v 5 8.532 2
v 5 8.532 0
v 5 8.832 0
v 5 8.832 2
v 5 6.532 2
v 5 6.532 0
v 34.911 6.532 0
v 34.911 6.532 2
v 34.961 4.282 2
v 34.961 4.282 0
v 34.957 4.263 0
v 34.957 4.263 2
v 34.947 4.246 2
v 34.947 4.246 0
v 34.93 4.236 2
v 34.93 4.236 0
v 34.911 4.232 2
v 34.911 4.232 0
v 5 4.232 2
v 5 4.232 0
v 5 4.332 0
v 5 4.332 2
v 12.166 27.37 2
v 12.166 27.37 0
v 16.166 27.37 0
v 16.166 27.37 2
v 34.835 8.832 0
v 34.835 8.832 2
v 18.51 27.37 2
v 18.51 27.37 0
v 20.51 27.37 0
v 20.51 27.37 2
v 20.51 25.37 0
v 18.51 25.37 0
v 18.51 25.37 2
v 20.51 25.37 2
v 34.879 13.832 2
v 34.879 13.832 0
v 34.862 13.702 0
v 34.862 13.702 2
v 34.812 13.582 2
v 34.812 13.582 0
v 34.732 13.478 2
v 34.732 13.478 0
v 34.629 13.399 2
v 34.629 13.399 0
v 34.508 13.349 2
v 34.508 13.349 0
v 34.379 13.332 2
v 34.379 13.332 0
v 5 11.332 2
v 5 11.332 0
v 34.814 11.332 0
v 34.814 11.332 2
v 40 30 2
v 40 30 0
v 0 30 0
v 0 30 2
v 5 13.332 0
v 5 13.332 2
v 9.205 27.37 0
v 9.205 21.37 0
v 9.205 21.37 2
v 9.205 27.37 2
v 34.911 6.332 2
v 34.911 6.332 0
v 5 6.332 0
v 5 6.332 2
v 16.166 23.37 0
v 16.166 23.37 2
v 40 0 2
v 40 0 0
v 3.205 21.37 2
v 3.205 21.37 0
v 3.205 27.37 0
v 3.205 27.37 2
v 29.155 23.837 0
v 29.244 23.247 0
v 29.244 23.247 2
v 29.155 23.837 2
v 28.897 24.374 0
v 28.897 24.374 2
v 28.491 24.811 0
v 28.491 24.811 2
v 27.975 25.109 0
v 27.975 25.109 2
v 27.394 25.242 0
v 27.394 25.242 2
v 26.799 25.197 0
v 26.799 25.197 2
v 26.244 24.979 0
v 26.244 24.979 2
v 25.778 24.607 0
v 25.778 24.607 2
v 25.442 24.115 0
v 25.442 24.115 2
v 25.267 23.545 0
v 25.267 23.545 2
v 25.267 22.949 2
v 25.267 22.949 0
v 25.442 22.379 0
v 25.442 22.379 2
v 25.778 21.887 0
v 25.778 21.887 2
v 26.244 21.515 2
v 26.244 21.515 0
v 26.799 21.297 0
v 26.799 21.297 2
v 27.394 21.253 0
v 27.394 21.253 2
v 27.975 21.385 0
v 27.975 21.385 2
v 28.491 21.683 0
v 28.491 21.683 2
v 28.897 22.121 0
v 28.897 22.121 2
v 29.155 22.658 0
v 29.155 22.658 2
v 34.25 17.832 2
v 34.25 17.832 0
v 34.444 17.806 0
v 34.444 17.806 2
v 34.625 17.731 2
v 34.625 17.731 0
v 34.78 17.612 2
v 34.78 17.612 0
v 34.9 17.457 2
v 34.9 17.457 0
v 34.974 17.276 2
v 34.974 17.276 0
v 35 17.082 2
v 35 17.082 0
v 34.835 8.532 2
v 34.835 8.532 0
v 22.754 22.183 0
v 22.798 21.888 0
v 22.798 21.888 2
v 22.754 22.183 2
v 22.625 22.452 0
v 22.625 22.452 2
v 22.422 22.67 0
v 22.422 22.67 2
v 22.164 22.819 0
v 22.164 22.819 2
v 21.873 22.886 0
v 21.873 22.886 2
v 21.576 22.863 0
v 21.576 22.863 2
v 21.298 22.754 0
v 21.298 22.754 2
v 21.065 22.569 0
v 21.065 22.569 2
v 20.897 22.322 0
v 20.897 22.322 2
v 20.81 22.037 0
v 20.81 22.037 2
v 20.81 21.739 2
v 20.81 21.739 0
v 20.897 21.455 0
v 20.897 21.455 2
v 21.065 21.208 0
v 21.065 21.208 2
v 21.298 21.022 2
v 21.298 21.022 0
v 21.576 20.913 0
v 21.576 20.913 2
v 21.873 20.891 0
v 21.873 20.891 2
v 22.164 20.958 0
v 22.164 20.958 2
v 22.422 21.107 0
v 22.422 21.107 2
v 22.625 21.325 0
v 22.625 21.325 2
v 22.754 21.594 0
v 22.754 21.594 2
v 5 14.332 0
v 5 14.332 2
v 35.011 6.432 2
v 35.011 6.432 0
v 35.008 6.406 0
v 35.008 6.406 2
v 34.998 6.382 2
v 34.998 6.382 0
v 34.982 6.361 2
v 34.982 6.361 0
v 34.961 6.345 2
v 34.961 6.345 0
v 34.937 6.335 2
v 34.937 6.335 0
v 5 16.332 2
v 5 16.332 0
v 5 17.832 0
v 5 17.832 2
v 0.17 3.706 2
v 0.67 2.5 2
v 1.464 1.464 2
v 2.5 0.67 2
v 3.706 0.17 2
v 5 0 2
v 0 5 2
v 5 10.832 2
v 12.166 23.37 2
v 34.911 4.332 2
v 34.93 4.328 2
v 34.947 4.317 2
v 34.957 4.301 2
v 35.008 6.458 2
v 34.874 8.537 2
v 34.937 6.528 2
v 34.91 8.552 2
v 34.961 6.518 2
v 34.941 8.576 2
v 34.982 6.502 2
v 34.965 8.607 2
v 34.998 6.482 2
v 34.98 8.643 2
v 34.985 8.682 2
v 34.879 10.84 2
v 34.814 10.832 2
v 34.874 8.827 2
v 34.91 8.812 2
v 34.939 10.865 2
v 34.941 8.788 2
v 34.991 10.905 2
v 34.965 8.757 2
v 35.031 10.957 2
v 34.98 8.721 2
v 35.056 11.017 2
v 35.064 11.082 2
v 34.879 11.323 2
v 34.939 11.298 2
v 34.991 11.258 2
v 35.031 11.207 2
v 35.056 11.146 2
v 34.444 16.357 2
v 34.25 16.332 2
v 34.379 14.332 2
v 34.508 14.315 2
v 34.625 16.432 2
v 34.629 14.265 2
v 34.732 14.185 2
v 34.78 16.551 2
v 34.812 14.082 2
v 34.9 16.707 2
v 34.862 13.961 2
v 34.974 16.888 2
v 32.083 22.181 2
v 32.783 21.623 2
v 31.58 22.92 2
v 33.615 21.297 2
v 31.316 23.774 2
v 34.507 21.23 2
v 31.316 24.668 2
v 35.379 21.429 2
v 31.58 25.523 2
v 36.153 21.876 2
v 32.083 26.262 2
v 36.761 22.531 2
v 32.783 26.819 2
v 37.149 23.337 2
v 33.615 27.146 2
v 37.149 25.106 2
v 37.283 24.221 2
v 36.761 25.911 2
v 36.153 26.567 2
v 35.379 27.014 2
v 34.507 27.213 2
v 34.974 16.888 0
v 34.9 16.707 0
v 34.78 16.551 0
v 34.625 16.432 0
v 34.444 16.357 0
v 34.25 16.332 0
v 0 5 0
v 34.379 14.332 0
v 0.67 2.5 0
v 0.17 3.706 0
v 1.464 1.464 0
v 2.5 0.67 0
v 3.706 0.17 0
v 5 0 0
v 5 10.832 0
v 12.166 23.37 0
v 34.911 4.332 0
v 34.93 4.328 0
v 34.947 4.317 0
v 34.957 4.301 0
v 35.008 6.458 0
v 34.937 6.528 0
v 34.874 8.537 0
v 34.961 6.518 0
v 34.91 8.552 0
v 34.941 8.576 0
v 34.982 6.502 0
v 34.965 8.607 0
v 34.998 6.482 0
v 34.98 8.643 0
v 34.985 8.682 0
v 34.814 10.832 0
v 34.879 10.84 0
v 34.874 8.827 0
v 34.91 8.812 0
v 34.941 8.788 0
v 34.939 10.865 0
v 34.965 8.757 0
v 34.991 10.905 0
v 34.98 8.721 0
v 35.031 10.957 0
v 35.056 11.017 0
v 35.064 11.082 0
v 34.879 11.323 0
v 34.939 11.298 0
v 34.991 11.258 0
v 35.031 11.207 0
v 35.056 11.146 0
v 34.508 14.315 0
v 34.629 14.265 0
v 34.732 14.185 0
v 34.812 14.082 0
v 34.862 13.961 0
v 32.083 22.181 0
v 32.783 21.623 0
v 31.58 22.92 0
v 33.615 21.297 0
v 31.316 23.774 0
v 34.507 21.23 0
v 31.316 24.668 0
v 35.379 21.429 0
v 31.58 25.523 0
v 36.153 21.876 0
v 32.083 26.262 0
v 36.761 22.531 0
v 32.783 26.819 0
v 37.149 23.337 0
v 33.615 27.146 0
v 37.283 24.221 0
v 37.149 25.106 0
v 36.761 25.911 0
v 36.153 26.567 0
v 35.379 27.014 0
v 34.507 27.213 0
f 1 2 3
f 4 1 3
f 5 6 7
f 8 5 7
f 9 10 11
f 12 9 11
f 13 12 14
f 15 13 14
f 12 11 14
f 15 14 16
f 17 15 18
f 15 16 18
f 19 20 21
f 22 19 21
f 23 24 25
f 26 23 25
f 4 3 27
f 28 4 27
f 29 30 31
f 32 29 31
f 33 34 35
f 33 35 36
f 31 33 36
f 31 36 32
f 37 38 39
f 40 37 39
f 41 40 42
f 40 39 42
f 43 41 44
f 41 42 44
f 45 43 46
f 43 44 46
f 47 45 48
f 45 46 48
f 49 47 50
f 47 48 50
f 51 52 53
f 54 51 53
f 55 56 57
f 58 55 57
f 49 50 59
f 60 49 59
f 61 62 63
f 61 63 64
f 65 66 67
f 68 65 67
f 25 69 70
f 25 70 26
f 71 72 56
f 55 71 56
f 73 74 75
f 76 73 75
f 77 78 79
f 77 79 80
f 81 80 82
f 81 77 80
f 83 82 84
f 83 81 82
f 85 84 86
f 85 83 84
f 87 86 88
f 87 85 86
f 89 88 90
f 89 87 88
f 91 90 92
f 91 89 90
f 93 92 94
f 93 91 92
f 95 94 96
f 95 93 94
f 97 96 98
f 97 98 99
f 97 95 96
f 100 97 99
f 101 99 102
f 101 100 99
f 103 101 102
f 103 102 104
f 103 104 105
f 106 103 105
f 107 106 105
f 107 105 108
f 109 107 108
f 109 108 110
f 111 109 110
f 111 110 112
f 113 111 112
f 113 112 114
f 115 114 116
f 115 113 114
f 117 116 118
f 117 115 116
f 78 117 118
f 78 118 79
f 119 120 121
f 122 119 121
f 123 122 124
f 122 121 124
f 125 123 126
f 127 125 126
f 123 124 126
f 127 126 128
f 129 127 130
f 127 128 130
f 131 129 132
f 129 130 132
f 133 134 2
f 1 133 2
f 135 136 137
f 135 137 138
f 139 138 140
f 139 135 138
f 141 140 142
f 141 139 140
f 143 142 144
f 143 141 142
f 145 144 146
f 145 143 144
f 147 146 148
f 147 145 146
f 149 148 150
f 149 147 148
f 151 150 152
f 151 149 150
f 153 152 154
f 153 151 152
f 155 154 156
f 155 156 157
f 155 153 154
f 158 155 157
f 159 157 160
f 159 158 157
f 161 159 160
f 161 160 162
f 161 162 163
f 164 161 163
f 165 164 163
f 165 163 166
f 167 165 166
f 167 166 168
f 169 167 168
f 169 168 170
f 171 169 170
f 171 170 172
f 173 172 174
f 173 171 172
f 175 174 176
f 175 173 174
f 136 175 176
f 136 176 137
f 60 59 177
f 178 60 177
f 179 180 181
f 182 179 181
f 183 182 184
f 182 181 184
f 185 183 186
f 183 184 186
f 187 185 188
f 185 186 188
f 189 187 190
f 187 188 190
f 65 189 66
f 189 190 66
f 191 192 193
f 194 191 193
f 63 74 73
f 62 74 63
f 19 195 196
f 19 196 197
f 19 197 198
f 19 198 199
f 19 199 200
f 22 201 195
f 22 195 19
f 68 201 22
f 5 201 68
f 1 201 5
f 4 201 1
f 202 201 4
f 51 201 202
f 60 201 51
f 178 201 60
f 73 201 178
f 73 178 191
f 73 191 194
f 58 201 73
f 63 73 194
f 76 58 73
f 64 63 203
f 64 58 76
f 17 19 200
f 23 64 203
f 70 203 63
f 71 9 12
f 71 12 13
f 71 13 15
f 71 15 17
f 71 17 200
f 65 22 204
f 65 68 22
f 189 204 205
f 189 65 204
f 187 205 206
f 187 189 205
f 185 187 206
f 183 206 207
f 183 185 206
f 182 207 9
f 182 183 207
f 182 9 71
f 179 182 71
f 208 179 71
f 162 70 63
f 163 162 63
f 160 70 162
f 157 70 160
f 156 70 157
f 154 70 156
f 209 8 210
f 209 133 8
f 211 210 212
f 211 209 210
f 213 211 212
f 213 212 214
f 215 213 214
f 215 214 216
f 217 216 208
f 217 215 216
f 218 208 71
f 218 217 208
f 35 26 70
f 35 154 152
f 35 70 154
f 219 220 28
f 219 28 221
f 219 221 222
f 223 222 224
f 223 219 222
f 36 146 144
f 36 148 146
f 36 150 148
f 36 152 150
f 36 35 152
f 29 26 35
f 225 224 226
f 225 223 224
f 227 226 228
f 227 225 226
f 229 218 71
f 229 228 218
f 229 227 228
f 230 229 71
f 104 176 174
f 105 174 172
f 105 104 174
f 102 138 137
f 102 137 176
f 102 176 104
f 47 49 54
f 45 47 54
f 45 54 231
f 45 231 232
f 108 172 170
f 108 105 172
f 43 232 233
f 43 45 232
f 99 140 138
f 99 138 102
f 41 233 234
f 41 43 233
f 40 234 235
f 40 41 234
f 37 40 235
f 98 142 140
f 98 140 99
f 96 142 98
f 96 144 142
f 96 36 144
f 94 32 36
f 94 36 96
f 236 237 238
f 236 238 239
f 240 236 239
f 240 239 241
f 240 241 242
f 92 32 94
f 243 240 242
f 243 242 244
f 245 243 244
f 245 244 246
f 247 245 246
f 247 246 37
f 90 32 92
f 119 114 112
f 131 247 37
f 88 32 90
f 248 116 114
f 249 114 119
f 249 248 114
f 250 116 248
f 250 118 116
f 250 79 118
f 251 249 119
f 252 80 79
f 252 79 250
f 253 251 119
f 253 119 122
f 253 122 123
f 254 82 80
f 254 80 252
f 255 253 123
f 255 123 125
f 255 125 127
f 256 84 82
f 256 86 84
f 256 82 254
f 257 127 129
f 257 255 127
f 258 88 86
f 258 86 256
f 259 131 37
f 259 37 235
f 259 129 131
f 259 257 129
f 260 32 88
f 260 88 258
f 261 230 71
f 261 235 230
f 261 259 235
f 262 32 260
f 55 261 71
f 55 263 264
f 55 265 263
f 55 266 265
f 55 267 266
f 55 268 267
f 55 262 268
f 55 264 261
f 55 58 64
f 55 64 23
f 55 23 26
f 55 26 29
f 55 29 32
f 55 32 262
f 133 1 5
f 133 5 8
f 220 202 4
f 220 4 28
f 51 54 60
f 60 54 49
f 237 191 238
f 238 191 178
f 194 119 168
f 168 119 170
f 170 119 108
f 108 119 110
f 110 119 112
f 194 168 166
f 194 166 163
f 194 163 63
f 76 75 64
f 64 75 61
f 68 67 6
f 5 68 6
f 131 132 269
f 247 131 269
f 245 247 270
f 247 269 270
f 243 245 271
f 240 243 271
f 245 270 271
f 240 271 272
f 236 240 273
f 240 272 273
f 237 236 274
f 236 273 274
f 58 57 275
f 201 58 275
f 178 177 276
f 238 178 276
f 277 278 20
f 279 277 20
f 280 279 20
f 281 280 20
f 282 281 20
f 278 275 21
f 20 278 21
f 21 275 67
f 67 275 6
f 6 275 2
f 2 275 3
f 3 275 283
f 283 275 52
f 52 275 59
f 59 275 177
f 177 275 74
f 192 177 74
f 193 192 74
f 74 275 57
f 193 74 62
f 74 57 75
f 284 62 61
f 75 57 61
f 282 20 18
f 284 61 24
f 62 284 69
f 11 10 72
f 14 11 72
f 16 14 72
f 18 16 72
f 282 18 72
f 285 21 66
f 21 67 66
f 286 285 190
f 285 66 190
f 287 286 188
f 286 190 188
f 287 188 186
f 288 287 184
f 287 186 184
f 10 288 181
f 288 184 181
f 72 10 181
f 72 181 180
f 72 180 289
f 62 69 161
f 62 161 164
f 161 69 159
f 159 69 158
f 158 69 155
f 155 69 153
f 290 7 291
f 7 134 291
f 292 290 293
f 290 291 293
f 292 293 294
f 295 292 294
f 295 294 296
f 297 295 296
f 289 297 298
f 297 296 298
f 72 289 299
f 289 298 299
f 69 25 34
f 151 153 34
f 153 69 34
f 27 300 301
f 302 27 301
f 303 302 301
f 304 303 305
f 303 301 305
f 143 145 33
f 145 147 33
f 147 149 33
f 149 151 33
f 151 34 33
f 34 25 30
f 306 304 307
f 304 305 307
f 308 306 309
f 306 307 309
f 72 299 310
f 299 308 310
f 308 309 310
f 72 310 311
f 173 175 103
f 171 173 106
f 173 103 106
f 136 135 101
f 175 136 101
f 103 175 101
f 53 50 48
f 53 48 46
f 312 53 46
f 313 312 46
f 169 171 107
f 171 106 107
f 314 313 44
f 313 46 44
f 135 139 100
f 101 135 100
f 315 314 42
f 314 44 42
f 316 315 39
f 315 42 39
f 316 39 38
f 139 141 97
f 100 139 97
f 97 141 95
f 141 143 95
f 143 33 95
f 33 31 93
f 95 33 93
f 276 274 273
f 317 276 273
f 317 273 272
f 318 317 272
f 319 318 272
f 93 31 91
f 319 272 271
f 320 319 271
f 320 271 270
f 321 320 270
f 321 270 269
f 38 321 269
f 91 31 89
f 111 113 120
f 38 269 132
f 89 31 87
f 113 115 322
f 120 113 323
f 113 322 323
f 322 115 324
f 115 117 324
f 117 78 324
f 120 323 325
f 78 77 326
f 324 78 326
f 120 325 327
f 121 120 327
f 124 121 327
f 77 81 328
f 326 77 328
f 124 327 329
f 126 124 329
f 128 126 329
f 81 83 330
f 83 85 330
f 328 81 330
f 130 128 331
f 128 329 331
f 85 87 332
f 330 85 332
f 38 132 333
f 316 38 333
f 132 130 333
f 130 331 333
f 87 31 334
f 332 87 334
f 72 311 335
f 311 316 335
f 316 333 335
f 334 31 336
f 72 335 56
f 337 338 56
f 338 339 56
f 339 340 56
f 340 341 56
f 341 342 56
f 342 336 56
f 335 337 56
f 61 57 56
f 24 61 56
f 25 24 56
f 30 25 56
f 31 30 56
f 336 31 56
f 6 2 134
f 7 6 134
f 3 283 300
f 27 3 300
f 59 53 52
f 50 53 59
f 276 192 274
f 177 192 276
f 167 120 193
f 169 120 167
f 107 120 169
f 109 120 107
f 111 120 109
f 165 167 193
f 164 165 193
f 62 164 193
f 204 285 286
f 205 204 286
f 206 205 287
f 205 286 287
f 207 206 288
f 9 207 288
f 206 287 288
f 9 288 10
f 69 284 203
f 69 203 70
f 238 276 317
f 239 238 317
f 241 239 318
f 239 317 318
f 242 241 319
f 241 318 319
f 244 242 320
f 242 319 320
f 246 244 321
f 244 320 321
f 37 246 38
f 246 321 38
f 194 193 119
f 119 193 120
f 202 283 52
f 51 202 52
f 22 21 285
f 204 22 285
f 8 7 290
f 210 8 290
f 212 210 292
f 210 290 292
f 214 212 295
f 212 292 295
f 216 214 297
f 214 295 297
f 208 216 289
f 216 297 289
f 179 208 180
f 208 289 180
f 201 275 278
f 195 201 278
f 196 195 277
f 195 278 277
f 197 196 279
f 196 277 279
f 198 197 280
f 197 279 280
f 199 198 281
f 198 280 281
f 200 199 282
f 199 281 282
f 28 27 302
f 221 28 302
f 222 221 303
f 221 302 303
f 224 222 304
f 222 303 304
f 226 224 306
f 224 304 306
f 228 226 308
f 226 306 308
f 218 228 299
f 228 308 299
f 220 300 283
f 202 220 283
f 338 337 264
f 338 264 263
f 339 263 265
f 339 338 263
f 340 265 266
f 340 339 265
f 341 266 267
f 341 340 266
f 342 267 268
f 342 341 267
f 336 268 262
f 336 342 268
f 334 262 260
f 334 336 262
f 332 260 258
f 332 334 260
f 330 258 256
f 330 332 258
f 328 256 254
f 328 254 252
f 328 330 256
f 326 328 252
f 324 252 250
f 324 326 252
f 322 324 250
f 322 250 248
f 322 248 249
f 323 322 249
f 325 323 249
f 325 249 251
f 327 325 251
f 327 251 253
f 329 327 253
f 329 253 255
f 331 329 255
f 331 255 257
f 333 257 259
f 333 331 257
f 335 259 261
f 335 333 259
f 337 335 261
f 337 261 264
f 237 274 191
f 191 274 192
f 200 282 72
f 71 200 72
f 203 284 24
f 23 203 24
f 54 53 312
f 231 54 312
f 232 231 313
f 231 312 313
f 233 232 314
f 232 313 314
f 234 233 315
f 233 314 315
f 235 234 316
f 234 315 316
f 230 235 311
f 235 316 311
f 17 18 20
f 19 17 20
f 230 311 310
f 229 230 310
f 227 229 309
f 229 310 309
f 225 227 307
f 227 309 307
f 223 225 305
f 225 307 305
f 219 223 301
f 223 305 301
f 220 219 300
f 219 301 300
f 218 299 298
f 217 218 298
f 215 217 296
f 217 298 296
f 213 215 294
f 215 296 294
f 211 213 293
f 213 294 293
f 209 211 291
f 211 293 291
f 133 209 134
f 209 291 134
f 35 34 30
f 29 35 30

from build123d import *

# Parameters (mm, degrees)
F0_W     = 6
F0_H     = 6
F0_W_2   = 4
F0_H_2   = 4
F0_W_3   = 2
F0_H_3   = 2
F0_R     = 1
F0_R_2   = 2
F0_R_3   = 3
F1_DEPTH = 2


with BuildPart() as f1:
    # F0 (on Top) → F1 (new body)
    with BuildSketch(Plane.XY):
        with BuildLine():
            ThreePointArc((0, 5), (1.464466, 1.464466), (5, 0))
            Line((5, 0), (40, 0))
            Line((40, 0), (40, 30))
            Line((40, 30), (0, 30))
            Line((0, 30), (0, 5))
        make_face()
        with BuildLine():
            Line((5, 4.231699), (5, 4.331699))
            Line((5, 4.331699), (34.911151, 4.331699))
            ThreePointArc((34.911151, 4.331699), (34.946507, 4.317055), (34.961151, 4.281699))
            ThreePointArc((34.961151, 4.281699), (34.946507, 4.246344), (34.911151, 4.231699))
            Line((34.911151, 4.231699), (5, 4.231699))
        make_face(mode=Mode.SUBTRACT)
        with BuildLine():
            Line((5, 8.531699), (5, 8.831699))
            Line((5, 8.831699), (34.834979, 8.831699))
            ThreePointArc((34.834979, 8.831699), (34.941045, 8.787765), (34.984979, 8.681699))
            ThreePointArc((34.984979, 8.681699), (34.941045, 8.575633), (34.834979, 8.531699))
            Line((34.834979, 8.531699), (5, 8.531699))
        make_face(mode=Mode.SUBTRACT)
        with BuildLine():
            Line((5, 13.331699), (5, 14.331699))
            Line((5, 14.331699), (34.378945, 14.331699))
            ThreePointArc((34.378945, 14.331699), (34.732499, 14.185253), (34.878945, 13.831699))
            ThreePointArc((34.878945, 13.831699), (34.732499, 13.478146), (34.378945, 13.331699))
            Line((34.378945, 13.331699), (5, 13.331699))
        make_face(mode=Mode.SUBTRACT)
        with BuildLine():
            Line((5, 6.331699), (5, 6.531699))
            Line((5, 6.531699), (34.911151, 6.531699))
            ThreePointArc((34.911151, 6.531699), (34.981862, 6.50241), (35.011151, 6.431699))
            ThreePointArc((35.011151, 6.431699), (34.981862, 6.360989), (34.911151, 6.331699))
            Line((34.911151, 6.331699), (5, 6.331699))
        make_face(mode=Mode.SUBTRACT)
        with BuildLine():
            Line((5, 10.831699), (5, 11.331699))
            Line((5, 11.331699), (34.814051, 11.331699))
            ThreePointArc((34.814051, 11.331699), (34.990828, 11.258476), (35.064051, 11.081699))
            ThreePointArc((35.064051, 11.081699), (34.990828, 10.904923), (34.814051, 10.831699))
            Line((34.814051, 10.831699), (5, 10.831699))
        make_face(mode=Mode.SUBTRACT)
        with Locations((6.205281, 24.370336)):
            Rectangle(F0_W, F0_H, mode=Mode.SUBTRACT)
        with Locations((14.165812, 25.370336)):
            Rectangle(F0_W_2, F0_H_2, mode=Mode.SUBTRACT)
        with Locations((19.510129, 26.370336)):
            Rectangle(F0_W_3, F0_H_3, mode=Mode.SUBTRACT)
        with BuildLine():
            Line((5, 16.331699), (5, 17.831699))
            Line((5, 17.831699), (34.25, 17.831699))
            ThreePointArc((34.25, 17.831699), (34.78033, 17.612029), (35, 17.081699))
            ThreePointArc((35, 17.081699), (34.78033, 16.551369), (34.25, 16.331699))
            Line((34.25, 16.331699), (5, 16.331699))
        make_face(mode=Mode.SUBTRACT)
        with Locations((21.798409, 21.888405)):
            Circle(F0_R, mode=Mode.SUBTRACT)
        with Locations((27.244295, 23.247146)):
            Circle(F0_R_2, mode=Mode.SUBTRACT)
        with Locations((34.282601, 24.221355)):
            Circle(F0_R_3, mode=Mode.SUBTRACT)
    extrude(amount=F1_DEPTH)


solid = f1.part
